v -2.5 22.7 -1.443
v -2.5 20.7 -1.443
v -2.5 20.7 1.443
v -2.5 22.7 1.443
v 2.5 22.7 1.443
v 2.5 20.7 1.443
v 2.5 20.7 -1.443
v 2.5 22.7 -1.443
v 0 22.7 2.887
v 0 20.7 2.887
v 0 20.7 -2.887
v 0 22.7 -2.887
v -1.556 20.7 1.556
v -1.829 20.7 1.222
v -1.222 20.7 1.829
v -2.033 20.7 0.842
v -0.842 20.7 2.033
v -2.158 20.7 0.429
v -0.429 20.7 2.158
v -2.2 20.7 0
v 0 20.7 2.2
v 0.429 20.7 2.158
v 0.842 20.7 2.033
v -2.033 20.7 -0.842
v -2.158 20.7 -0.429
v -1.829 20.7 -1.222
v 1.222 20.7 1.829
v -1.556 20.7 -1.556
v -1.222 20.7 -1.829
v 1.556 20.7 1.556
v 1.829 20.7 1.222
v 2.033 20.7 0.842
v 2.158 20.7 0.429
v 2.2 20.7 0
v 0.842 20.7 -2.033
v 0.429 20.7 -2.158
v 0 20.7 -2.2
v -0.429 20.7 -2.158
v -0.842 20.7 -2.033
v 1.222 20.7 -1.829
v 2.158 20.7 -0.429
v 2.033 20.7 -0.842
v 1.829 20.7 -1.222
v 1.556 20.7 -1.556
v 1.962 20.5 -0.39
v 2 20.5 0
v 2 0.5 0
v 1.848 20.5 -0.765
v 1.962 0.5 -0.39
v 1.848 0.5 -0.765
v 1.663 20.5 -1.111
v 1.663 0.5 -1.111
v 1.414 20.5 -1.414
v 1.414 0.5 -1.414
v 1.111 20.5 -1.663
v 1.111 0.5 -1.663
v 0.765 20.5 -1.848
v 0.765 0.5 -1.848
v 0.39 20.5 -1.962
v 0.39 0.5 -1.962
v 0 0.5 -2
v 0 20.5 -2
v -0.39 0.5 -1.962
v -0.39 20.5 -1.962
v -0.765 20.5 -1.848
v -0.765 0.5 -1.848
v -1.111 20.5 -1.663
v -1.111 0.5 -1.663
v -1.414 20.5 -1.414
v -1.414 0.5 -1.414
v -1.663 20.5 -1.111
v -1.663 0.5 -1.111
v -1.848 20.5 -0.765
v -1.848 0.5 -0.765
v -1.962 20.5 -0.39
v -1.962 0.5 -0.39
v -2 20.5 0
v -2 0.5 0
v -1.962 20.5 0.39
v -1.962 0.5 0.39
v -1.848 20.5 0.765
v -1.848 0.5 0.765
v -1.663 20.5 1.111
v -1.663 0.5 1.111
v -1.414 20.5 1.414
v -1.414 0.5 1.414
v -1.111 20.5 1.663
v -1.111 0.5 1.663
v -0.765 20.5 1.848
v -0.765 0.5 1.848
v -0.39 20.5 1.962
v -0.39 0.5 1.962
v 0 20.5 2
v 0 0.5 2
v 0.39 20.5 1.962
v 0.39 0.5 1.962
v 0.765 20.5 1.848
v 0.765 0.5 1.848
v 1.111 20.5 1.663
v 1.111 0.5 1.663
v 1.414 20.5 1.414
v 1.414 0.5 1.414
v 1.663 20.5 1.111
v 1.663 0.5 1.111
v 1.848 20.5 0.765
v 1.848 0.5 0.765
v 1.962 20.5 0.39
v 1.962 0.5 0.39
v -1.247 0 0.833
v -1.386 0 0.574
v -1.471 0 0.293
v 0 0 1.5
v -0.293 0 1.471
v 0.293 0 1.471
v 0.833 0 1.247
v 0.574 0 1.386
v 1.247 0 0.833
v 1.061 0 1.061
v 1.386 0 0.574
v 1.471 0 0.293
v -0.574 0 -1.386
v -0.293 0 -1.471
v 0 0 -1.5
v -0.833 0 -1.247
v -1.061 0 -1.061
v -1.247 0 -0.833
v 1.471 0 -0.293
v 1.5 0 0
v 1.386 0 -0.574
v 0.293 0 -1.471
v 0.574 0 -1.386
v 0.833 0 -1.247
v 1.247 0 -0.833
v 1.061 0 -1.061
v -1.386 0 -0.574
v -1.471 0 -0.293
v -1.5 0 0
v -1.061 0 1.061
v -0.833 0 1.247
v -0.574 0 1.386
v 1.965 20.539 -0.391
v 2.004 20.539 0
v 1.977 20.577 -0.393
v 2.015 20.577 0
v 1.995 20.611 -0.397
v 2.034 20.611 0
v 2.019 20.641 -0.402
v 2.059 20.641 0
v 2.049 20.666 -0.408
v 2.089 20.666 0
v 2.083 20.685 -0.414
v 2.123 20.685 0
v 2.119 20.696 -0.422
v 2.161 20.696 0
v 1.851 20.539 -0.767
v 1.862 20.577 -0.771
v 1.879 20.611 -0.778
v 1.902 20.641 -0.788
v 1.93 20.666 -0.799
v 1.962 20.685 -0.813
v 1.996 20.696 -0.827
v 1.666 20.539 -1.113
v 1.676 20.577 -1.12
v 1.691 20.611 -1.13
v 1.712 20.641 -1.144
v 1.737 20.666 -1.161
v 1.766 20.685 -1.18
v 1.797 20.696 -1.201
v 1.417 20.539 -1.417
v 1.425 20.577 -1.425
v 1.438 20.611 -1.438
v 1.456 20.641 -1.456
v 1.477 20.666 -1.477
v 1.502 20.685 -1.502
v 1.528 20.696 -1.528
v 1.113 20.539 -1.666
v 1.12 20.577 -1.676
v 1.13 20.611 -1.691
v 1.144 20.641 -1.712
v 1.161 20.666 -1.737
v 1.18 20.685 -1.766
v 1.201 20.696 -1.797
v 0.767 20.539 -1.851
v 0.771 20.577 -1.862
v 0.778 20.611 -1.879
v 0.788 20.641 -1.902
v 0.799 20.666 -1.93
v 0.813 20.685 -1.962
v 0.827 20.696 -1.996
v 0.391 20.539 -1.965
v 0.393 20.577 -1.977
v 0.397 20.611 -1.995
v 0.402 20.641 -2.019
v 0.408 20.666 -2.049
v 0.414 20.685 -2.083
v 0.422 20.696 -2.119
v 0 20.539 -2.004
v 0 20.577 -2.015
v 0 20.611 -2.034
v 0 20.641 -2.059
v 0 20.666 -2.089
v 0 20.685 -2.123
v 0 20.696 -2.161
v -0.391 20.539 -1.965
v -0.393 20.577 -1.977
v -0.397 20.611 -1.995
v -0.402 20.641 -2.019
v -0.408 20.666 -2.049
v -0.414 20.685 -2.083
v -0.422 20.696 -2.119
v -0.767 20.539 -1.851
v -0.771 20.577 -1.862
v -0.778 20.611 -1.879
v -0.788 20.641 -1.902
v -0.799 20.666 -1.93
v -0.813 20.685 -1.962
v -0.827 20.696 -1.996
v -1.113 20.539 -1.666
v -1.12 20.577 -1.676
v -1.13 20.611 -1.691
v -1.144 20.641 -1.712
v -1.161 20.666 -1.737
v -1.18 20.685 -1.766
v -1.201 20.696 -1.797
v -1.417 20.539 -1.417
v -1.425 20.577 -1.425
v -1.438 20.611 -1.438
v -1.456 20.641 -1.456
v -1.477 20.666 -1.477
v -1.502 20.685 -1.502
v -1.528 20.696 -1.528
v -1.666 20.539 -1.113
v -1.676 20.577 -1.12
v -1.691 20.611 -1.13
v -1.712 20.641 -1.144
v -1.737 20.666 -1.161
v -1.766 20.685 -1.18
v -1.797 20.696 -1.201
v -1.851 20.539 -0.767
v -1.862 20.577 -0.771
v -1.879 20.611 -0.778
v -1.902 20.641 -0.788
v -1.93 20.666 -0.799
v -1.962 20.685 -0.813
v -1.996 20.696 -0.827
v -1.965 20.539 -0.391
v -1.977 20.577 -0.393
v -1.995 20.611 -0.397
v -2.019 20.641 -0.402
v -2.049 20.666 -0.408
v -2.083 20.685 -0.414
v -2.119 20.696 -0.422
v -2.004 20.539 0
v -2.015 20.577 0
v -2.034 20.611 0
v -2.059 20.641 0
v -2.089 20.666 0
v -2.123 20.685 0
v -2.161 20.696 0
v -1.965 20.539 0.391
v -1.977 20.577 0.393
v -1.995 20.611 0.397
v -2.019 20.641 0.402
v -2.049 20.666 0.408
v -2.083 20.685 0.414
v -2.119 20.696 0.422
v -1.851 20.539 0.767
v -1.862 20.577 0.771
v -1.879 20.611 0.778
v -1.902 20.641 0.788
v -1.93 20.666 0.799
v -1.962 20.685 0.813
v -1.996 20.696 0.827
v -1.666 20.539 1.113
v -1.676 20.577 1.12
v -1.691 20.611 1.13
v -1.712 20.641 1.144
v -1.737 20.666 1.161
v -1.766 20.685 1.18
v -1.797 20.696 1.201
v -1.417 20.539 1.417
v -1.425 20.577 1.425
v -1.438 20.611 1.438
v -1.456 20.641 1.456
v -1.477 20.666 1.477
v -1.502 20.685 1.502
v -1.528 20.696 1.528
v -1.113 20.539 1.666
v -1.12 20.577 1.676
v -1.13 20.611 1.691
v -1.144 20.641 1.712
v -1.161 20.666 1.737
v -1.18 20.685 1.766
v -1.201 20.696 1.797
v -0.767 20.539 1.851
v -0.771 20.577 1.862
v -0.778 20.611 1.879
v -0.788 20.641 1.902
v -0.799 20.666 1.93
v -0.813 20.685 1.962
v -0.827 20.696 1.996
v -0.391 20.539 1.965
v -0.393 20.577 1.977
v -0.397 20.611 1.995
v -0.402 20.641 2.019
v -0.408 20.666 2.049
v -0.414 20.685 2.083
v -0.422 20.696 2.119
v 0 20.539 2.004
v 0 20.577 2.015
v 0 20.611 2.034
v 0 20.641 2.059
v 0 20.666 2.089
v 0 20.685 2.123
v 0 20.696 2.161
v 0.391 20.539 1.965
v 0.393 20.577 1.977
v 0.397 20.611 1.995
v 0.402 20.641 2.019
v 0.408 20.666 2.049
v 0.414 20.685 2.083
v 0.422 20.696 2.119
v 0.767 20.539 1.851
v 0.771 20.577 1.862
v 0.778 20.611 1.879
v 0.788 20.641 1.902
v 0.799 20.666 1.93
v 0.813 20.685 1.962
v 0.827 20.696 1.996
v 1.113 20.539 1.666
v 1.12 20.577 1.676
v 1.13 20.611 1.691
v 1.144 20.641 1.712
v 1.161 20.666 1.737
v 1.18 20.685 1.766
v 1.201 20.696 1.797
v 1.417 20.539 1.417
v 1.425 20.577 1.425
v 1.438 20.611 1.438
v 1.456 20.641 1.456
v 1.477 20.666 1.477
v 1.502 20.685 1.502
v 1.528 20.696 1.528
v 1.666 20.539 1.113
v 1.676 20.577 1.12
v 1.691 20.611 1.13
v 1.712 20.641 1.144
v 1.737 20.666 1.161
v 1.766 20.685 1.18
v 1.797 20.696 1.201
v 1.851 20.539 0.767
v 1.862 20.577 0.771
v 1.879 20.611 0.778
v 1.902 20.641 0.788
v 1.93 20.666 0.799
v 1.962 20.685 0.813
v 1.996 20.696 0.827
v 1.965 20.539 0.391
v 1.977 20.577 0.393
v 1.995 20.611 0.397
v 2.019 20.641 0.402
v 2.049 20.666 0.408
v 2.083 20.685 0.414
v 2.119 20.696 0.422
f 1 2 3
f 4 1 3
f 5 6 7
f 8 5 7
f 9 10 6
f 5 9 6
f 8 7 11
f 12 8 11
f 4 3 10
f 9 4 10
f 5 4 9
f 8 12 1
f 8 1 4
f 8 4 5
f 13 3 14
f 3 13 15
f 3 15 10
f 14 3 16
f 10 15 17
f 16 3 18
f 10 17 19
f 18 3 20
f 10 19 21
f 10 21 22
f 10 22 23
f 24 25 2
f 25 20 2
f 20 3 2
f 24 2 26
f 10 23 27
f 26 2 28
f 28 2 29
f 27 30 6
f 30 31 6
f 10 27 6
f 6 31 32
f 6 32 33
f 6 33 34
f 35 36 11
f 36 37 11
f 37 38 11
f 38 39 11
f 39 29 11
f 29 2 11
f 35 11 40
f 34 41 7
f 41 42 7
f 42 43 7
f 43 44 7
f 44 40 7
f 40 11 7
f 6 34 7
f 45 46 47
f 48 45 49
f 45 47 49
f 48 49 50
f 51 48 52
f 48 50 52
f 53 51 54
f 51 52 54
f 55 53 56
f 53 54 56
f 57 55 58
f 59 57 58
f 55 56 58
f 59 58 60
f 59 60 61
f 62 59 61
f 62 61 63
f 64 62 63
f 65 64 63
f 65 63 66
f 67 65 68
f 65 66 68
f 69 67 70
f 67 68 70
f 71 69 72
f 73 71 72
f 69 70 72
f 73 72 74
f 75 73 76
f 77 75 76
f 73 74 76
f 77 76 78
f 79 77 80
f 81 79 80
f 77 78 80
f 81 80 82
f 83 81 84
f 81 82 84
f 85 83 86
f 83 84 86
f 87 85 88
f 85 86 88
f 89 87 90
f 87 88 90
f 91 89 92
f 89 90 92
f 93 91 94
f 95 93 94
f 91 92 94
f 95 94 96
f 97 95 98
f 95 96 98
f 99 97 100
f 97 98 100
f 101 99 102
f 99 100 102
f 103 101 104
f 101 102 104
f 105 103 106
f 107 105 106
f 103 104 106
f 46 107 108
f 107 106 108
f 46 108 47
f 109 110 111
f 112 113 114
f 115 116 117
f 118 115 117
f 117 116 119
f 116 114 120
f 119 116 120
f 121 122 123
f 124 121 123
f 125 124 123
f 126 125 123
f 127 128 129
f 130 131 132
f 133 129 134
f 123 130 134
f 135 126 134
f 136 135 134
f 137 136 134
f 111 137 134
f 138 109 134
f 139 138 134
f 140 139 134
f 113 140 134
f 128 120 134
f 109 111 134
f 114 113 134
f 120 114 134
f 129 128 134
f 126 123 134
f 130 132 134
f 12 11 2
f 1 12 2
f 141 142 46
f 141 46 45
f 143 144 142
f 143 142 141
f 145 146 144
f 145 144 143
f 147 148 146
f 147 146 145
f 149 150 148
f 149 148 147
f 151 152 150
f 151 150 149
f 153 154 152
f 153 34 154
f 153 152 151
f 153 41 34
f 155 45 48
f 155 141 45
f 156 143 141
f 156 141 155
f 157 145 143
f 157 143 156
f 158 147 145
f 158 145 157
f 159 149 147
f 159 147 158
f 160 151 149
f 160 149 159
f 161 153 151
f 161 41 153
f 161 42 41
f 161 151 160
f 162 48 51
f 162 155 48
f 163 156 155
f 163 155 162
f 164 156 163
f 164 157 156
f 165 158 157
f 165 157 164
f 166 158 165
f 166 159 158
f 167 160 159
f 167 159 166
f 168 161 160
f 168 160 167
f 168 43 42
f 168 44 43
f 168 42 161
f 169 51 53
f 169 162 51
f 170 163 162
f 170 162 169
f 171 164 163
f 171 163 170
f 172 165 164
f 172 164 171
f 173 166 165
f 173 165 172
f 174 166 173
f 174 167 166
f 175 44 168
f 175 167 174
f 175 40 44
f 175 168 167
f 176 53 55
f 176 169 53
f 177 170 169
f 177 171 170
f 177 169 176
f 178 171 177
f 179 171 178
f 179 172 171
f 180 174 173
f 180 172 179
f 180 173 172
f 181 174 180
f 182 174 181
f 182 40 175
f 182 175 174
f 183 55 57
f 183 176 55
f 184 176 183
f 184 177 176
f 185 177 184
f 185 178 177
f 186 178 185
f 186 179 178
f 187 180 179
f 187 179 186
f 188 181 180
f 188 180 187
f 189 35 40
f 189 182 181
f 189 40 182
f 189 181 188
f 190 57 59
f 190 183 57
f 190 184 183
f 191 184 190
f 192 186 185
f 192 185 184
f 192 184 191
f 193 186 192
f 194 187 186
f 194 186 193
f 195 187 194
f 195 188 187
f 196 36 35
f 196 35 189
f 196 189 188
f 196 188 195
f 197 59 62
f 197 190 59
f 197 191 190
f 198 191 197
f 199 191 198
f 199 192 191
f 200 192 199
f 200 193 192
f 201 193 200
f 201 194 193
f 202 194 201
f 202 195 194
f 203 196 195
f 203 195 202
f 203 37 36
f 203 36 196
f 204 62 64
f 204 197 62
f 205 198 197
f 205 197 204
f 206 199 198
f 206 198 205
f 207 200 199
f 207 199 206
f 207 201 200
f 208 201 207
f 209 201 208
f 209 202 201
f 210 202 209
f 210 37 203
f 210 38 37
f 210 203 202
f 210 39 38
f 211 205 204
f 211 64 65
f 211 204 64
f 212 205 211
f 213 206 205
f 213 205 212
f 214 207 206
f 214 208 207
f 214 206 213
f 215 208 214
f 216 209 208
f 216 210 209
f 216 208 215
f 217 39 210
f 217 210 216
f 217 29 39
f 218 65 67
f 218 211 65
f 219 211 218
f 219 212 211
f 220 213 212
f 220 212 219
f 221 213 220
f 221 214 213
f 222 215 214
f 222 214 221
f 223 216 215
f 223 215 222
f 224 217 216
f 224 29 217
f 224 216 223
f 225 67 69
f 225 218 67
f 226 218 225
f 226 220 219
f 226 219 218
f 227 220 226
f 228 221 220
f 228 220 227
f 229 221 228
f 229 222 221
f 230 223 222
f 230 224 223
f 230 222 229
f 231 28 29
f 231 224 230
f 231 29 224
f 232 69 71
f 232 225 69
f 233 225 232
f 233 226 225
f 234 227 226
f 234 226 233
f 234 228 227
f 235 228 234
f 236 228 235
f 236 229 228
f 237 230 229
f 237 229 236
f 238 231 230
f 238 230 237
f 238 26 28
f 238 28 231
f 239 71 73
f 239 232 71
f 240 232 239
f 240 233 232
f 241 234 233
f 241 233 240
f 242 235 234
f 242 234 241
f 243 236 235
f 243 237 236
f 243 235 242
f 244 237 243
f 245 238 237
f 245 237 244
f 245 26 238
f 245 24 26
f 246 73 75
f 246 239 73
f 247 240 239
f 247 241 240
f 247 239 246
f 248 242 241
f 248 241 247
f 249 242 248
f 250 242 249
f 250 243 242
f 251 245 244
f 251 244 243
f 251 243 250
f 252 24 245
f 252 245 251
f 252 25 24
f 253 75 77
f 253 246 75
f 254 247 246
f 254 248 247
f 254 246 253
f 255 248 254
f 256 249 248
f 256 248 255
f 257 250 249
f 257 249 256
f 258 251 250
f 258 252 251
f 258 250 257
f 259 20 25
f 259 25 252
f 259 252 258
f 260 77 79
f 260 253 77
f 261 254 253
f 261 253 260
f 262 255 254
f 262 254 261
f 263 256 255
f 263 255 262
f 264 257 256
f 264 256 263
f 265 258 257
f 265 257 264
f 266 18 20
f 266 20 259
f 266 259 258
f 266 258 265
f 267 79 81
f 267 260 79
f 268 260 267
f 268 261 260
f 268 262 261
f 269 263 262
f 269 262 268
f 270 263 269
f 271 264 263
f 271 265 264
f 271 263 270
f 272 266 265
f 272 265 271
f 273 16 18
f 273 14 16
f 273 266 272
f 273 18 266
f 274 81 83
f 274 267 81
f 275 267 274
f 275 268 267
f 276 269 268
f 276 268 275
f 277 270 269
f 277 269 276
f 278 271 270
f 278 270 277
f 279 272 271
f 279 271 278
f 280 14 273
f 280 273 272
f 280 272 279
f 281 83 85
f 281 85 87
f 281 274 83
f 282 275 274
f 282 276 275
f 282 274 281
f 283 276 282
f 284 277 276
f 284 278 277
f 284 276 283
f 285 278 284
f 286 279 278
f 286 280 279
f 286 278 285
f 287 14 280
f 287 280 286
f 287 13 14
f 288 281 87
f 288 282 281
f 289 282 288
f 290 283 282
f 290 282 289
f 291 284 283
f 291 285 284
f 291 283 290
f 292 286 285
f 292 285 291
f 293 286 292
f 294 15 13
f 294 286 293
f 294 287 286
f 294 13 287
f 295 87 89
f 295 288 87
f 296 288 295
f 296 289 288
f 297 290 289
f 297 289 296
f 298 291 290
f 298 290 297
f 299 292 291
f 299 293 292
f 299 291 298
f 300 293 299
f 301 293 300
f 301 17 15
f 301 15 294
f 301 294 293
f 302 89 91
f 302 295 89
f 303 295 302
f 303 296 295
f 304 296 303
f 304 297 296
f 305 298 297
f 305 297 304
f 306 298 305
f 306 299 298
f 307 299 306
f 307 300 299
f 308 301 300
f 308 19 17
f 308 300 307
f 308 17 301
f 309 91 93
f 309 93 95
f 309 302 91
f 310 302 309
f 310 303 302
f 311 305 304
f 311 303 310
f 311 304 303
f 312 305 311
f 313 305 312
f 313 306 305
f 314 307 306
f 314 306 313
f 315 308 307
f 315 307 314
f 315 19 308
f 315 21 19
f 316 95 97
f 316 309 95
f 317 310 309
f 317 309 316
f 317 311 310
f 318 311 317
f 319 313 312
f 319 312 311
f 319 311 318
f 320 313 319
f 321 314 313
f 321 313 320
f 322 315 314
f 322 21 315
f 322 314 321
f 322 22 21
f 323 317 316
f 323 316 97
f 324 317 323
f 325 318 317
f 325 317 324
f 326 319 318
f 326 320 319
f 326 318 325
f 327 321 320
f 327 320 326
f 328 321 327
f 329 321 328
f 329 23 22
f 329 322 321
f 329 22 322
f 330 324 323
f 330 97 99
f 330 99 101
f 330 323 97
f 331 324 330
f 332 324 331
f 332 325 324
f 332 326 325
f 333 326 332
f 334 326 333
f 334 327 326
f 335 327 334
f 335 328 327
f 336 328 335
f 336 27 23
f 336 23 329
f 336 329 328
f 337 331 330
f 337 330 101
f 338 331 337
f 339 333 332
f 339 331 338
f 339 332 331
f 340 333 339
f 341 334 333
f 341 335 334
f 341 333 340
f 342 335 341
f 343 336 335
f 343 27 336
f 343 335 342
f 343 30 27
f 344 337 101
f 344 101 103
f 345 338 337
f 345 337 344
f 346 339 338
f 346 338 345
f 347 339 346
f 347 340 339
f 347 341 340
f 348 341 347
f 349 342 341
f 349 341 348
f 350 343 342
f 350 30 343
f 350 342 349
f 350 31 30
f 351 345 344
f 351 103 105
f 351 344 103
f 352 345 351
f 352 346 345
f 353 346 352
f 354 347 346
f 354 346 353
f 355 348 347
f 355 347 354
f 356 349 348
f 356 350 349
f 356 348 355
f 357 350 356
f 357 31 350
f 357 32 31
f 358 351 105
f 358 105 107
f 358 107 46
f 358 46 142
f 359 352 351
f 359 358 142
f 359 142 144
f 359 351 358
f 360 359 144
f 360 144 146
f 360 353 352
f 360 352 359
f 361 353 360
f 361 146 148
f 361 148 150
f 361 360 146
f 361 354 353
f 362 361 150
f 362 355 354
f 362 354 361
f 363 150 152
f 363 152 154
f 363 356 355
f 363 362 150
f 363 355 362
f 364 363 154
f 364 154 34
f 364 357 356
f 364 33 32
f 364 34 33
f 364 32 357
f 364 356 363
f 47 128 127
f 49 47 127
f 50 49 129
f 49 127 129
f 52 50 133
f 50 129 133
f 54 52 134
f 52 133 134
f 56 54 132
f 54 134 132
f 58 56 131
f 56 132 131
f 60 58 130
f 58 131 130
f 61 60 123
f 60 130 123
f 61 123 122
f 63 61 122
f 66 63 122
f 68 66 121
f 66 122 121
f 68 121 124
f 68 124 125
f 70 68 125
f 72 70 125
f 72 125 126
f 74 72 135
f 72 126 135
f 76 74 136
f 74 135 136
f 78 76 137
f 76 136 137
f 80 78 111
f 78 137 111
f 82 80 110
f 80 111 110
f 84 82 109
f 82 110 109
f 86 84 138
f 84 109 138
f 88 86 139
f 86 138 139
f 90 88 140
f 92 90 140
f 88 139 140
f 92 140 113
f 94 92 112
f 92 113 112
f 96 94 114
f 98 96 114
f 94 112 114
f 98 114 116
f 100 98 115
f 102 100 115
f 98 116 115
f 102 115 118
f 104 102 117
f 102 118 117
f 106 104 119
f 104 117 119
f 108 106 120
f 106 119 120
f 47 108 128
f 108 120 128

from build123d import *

# Parameters (mm, degrees)
SKETCH1_R           = 2
BOSS_EXTRUDE1_DEPTH = 20.7
BOSS_EXTRUDE2_DEPTH = 2
CHAMFER1_SIZE       = 0.5
FILLET1_R           = 0.2


with BuildPart() as part:
    # Sketch1 → Boss-Extrude1 (new body)
    with BuildSketch(Plane(origin=(0, 0, 0), x_dir=(1, 0, 0), z_dir=(0, 1, 0))):
        Circle(SKETCH1_R)
    extrude(amount=BOSS_EXTRUDE1_DEPTH)

    # Sketch2 → Boss-Extrude2 (add)
    with BuildSketch(Plane(origin=(0, 20.7, 0), x_dir=(1, 0, 0), z_dir=(0, 1, 0))):
        Polygon((0, 2.886751346), (-2.5, 1.443375673), (-2.5, -1.443375673), (0, -2.886751346), (2.5, -1.443375673), (2.5, 1.443375673), align=None)
    extrude(amount=BOSS_EXTRUDE2_DEPTH)

    # Chamfer1
    chamfer1_edges = [part.edges().sort_by_distance(p)[0] for p in [
        (-2, 0, 0),
    ]]
    chamfer(chamfer1_edges, length=CHAMFER1_SIZE)

    # Fillet1
    fillet1_edges = [part.edges().sort_by_distance(p)[0] for p in [
        (-2, 20.7, 0),
    ]]
    fillet(fillet1_edges, radius=FILLET1_R)


solid = part.part
